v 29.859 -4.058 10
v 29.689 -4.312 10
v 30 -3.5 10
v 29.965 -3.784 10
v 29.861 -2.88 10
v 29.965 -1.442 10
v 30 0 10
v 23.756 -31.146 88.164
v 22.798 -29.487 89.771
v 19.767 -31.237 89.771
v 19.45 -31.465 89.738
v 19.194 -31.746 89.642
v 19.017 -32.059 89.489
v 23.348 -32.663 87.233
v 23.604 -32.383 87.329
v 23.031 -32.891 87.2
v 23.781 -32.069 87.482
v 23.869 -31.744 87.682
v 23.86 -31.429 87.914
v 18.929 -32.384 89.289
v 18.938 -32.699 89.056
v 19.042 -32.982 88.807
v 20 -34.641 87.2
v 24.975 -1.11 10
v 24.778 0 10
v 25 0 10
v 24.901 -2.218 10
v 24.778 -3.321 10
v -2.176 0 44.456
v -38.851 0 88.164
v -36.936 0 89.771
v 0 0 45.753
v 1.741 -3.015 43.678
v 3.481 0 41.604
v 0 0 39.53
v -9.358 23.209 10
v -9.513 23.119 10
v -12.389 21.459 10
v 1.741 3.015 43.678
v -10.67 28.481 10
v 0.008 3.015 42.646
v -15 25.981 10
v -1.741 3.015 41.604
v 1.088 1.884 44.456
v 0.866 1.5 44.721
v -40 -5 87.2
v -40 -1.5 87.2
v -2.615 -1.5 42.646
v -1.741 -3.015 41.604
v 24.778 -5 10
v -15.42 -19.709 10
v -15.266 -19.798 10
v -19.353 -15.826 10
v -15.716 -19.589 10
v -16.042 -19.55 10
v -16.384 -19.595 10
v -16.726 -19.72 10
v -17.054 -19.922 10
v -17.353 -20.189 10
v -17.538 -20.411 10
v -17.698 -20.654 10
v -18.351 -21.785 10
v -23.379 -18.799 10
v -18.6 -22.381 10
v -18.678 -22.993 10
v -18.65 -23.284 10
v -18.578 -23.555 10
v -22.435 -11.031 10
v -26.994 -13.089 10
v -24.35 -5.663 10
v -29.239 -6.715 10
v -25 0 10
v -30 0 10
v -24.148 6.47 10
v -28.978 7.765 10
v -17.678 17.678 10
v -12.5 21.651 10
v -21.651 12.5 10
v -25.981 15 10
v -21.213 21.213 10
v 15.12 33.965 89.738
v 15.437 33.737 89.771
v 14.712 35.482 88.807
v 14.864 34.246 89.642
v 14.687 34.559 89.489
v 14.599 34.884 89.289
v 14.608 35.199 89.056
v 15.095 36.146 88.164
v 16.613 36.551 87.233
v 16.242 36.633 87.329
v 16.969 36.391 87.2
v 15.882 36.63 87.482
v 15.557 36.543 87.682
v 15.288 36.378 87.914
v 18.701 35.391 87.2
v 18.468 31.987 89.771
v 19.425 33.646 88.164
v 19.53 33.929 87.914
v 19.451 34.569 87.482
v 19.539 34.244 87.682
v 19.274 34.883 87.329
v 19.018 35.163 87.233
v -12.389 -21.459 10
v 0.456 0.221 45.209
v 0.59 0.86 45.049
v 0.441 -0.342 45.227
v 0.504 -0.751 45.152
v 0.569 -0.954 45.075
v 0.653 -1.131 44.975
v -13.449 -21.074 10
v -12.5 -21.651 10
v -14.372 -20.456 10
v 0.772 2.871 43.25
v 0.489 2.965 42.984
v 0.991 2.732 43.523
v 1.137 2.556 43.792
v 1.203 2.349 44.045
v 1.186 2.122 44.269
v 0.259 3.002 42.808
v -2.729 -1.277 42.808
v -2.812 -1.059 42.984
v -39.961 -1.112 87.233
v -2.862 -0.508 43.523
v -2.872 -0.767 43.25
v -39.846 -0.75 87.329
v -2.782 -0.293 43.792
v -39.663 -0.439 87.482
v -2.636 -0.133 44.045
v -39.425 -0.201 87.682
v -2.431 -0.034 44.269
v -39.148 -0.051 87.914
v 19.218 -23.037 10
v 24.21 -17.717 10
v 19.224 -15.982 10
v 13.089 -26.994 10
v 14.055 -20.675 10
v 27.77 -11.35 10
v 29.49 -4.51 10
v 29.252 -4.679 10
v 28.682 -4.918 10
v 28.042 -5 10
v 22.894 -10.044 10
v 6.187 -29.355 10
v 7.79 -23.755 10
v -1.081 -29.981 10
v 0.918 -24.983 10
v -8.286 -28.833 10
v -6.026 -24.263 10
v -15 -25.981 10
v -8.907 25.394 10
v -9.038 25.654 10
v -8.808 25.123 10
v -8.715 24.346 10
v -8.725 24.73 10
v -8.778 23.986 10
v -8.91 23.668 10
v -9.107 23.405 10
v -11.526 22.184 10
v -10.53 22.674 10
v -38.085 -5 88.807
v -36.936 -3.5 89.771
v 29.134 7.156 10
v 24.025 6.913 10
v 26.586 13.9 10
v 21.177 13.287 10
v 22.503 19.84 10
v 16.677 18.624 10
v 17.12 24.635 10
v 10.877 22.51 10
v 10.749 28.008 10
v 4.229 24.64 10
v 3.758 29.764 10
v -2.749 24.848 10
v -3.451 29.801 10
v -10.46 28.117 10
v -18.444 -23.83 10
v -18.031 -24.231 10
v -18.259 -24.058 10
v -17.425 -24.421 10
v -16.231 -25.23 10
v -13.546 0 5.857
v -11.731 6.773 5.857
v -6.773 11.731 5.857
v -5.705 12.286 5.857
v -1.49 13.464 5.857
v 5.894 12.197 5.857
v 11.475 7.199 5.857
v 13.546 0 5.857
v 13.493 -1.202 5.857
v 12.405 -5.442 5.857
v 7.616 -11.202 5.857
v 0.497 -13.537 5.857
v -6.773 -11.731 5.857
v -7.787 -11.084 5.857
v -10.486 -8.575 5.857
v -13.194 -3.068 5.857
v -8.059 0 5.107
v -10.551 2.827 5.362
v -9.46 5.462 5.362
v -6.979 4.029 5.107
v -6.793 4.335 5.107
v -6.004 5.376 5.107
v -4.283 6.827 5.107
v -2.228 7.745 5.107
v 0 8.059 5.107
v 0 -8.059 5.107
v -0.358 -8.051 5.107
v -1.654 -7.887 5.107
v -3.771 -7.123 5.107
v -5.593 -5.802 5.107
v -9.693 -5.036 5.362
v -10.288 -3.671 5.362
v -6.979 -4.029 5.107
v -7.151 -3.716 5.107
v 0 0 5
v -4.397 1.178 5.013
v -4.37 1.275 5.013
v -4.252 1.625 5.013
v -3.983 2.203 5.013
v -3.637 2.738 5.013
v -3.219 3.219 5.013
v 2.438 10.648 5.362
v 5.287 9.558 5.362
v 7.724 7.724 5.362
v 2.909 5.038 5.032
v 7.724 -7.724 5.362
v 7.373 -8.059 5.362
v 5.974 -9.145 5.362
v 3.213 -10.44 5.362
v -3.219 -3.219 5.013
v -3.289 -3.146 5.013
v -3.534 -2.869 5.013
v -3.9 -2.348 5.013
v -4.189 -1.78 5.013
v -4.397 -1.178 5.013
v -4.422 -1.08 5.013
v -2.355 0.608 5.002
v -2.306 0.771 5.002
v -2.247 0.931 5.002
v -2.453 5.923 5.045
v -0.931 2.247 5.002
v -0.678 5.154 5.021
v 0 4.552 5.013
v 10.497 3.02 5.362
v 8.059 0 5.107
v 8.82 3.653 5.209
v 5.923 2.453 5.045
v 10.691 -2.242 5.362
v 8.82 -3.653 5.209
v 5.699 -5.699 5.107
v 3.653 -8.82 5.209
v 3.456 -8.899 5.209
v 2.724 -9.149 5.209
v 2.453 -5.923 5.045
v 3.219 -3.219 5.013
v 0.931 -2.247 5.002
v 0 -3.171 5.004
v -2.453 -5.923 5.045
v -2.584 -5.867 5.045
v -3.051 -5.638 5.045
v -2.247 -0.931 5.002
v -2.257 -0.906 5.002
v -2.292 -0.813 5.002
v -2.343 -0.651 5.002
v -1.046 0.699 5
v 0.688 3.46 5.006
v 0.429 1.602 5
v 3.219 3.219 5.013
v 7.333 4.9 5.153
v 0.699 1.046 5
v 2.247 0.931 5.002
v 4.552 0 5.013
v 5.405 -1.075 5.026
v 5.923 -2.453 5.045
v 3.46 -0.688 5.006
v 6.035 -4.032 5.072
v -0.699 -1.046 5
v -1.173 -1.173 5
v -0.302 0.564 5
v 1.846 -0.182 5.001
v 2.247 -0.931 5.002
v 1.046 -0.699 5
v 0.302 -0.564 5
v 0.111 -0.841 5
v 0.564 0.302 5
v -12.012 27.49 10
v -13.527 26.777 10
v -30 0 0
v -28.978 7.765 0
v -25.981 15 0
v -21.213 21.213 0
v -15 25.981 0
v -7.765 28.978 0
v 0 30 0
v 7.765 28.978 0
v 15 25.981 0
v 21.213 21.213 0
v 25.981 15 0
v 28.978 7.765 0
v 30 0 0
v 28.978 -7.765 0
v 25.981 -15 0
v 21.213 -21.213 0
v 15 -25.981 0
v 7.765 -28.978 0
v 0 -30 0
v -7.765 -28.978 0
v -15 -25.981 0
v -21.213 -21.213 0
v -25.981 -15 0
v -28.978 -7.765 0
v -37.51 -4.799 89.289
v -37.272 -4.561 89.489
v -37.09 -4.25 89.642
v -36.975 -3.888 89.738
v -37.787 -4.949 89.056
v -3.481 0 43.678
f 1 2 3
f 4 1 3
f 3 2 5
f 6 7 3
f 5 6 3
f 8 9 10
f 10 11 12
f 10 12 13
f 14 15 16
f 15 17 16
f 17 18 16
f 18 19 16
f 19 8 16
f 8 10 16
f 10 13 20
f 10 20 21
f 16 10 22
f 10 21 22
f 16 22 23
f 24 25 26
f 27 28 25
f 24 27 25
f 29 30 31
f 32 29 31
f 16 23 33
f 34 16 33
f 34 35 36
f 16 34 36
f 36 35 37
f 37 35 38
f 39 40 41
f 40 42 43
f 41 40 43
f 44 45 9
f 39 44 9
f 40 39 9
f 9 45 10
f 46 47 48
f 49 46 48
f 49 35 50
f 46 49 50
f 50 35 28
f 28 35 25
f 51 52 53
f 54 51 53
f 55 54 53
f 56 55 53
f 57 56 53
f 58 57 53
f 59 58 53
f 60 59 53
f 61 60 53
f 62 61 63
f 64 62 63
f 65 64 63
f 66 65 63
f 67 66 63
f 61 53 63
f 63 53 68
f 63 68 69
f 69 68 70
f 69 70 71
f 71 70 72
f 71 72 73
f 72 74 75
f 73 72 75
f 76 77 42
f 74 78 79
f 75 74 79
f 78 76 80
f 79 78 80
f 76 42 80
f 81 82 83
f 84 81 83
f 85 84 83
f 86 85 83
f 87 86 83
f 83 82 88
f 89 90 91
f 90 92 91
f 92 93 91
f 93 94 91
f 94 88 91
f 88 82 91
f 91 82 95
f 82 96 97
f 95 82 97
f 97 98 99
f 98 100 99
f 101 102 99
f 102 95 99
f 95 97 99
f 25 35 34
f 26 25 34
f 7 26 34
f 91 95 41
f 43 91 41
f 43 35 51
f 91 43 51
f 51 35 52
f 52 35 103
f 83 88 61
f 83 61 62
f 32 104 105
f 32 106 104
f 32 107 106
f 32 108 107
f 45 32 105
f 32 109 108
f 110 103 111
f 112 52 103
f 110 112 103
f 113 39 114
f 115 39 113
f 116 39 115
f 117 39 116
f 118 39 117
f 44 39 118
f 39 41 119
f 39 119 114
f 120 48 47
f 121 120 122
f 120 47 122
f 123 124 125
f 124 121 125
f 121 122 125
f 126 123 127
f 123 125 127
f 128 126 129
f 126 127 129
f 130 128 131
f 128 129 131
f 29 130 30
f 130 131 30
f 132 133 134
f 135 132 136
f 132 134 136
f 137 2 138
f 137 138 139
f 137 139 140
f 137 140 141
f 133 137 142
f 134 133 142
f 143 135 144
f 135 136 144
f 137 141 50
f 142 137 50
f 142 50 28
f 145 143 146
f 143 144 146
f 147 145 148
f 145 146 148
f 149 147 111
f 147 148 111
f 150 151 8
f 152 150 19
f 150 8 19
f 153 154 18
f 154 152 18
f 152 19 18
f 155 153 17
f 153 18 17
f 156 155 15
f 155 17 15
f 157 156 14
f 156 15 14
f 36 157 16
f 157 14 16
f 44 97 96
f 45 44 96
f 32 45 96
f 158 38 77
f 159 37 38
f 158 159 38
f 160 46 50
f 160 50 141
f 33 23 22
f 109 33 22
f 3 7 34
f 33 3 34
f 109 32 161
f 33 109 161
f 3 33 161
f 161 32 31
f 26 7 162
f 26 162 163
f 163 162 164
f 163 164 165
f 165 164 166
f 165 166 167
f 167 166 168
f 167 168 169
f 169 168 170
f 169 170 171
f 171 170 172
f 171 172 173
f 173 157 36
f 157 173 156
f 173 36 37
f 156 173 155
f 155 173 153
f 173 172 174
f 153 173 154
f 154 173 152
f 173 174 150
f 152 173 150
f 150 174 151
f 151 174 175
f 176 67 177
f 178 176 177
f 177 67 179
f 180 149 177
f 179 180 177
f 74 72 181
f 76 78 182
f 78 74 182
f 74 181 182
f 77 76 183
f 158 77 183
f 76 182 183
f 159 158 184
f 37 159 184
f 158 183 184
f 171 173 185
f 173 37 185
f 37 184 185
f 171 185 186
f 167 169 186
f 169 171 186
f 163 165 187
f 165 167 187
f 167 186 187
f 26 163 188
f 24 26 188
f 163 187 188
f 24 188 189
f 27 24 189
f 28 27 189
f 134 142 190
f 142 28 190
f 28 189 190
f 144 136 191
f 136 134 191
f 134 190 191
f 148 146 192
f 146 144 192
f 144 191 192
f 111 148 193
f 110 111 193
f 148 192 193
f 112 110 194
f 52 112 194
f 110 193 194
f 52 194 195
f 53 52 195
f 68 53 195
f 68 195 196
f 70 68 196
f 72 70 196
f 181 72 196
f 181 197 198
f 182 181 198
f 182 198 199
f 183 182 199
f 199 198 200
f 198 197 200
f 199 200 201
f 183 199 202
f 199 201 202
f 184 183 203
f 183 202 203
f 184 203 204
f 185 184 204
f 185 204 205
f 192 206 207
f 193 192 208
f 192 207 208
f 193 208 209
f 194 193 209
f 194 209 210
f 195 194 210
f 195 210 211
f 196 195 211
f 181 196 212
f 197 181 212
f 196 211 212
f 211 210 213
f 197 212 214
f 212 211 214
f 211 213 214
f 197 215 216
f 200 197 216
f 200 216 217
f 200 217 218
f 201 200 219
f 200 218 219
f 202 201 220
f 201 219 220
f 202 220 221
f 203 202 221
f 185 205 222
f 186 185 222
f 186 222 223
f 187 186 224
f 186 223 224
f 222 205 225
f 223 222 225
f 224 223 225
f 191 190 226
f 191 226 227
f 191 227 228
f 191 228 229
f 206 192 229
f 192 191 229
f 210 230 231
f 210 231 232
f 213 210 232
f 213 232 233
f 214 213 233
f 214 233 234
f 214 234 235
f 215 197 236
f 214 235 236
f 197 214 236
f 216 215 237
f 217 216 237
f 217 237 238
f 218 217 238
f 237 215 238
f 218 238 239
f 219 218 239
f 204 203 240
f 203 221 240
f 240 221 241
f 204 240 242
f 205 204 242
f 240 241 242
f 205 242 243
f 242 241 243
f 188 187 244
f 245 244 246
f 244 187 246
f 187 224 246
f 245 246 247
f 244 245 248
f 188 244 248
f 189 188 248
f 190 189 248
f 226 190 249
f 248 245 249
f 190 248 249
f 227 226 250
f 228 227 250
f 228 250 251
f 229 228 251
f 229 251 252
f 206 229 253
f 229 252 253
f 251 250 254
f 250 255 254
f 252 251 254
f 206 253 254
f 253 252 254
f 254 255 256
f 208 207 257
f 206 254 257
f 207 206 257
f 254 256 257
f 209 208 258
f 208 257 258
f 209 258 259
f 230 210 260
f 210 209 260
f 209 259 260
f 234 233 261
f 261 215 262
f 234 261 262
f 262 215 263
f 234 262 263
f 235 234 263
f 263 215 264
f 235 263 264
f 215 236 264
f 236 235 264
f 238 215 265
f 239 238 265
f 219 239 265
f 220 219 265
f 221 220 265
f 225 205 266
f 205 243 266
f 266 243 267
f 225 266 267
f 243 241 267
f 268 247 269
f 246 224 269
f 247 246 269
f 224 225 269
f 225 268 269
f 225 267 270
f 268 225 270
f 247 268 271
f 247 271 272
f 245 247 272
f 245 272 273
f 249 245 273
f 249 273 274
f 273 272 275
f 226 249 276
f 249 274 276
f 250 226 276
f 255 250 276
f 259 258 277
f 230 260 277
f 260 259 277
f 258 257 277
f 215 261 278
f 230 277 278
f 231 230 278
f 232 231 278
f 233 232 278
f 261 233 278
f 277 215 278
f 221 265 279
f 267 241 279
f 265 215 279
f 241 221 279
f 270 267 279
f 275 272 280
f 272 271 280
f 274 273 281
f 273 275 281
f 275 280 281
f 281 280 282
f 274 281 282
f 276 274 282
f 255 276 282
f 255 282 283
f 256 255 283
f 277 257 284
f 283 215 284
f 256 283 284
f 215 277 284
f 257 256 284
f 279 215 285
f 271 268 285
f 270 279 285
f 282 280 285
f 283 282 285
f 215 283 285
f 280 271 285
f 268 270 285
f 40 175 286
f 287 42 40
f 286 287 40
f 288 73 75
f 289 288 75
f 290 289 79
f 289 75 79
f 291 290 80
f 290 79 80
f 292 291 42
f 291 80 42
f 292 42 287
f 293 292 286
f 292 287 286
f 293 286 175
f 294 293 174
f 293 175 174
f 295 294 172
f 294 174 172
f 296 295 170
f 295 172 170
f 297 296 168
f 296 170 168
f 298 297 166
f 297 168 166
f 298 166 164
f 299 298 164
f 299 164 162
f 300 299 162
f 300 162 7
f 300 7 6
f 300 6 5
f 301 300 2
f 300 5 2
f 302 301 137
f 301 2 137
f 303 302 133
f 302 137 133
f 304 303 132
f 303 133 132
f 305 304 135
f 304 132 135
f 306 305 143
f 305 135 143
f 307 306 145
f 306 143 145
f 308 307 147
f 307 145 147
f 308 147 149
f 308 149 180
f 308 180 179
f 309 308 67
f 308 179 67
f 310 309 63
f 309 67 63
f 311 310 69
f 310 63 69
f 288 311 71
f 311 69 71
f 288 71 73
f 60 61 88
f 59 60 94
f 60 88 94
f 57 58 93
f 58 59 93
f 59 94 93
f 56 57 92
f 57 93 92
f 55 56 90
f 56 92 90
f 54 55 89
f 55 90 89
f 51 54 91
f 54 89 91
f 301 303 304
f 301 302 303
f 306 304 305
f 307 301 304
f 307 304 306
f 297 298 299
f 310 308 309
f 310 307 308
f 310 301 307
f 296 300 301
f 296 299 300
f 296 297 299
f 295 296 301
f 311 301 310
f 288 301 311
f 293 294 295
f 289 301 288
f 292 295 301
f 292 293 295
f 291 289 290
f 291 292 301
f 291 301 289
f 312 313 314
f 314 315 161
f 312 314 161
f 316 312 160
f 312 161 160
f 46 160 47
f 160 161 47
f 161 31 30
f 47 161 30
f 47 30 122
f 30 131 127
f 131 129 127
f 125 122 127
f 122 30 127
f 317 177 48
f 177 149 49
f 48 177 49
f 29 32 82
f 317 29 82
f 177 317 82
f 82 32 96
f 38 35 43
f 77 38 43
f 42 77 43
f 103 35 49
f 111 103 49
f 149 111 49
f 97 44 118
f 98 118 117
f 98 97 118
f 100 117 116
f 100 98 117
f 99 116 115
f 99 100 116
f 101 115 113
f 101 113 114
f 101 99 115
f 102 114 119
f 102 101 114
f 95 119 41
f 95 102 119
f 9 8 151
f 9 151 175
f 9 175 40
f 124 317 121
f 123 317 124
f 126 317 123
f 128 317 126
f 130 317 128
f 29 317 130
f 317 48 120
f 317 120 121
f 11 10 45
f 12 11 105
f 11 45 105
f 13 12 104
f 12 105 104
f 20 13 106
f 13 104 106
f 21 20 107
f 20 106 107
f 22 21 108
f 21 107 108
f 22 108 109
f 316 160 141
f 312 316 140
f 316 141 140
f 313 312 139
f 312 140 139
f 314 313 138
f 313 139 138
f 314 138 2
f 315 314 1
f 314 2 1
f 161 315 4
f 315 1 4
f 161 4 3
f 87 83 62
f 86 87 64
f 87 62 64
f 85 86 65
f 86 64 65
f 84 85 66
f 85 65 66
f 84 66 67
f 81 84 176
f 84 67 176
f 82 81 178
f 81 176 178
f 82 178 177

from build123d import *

# Parameters (mm, degrees)
F0_W         = 5
F0_H         = 10
F3_DEPTH     = 5
F4_COUNT     = 3
F5_T4_DEPTH  = 64.961938704
F5_T9_DEPTH  = 108.2772549851
F5_T14_DEPTH = 111.6336535099
F5_T19_DEPTH = 111.6336535099
F5_T24_DEPTH = 64.3133444777
F5_T29_DEPTH = 64.3133444777
F5_T34_DEPTH = 108.2772549851


# Not quite as in the source:
# - a fillet or chamfer that OpenCascade refuses, or shapes differently, is made with other operations: its cross-section is extruded or revolved along the edge and cut away or added


with BuildPart() as f1:
    # F0 (on Front) → F1 (revolve)
    with BuildSketch(Plane.XZ):
        with Locations((-27.5, 5)):
            Rectangle(F0_W, F0_H)
        with BuildLine():
            Line((-25, 10), (-25, 0))
            Line((-25, 0), (0, 0))
            Line((0, 0), (0, 5))
            add(Edge.make_bspline(
                [(-25, 10), (-12.5, 5), (-12.5, 5), (0, 5)],
                knots=[0, 0, 0, 0, 25.495097568, 25.495097568, 25.495097568, 25.495097568], degree=3))
        make_face()
    revolve(axis=Axis((0, 0, 2.5), (0, 0, -1)))

    # F2 (on Front) → F3 (join)
    with BuildSketch(Plane.XZ):
        Polygon((24.7783708427, 10), (30, 10), (-36.9358222275, 89.7710066129), (-40, 87.1998561742), align=None)
    extrude(amount=F3_DEPTH)

    # F4: F1 ×3 about axis
    f4_axis = Axis((0, 0, 2.5), (0, 0, -1))


with BuildPart() as f1_1:
    add(f1.part)
    for i in range(1, F4_COUNT):
        add(f1.part.rotate(f4_axis, i * 360 / F4_COUNT))

    # F5: fillet of radius 1.5 on 7 edges, made by hand


with BuildPart() as f5_tool2:
    # F5_s3 → F5_t4 (new body)
    with BuildSketch(Plane(origin=(10.0591539469, -17.4229657171, 23.9760657093), x_dir=(0.8660254038, 0.5, 0), z_dir=(0.3213938048, -0.5566703992, 0.7660444431))):
        with BuildLine():
            ThreePointArc((1.5, 29.4092093904), (0.4393398282, 28.9698695622), (0, 27.9092093904))
            Line((0, 27.9092093904), (0, 29.4092093904))
            Line((0, 29.4092093904), (1.5, 29.4092093904))
        make_face()
    extrude(amount=F5_T4_DEPTH)

    split(bisect_by=Plane(origin=(22.5287614301, 0, 18.9038754068), x_dir=(0, 1, 0), z_dir=(0.7660444431, 0, 0.6427876097)), keep=Keep.TOP)


with BuildPart() as f1_2:
    add(f1_1.part)

    # F5_t1: cut F5_tool2
    add(f5_tool2.part, mode=Mode.SUBTRACT)


with BuildPart() as f5_tool7:
    # F5_s8 → F5_t9 (new body)
    with BuildSketch(Plane(origin=(30.937518597, -53.58535407, 73.7397978677), x_dir=(-0.8660254038, -0.5, 0), z_dir=(-0.3213938048, 0.5566703992, -0.7660444431))):
        with BuildLine():
            ThreePointArc((-5, 26.9092093904), (-4.5606601718, 25.8485492187), (-3.5, 25.4092093904))
            Line((-3.5, 25.4092093904), (-5, 25.4092093904))
            Line((-5, 25.4092093904), (-5, 26.9092093904))
        make_face()
    extrude(amount=F5_T9_DEPTH)

    split(bisect_by=Plane.XY.offset(10), keep=Keep.TOP)


with BuildPart() as f1_3:
    add(f1_2.part)

    # F5_t6: cut F5_tool7
    add(f5_tool7.part, mode=Mode.SUBTRACT)


with BuildPart() as f5_tool12:
    # F5_s13 → F5_t14 (new body)
    with BuildSketch(Plane(origin=(9.8816921063, 0, -11.7765420685), x_dir=(0, 1, 0), z_dir=(-0.6427876097, 0, 0.7660444431))):
        with BuildLine():
            ThreePointArc((-5, -27.9092093904), (-4.5606601718, -28.9698695622), (-3.5, -29.4092093904))
            Line((-3.5, -29.4092093904), (-5, -29.4092093904))
            Line((-5, -29.4092093904), (-5, -27.9092093904))
        make_face()
    extrude(amount=F5_T14_DEPTH)

    split(bisect_by=Plane.XY.offset(10), keep=Keep.TOP)


with BuildPart() as f1_4:
    add(f1_3.part)

    # F5_t11: cut F5_tool12
    add(f5_tool12.part, mode=Mode.SUBTRACT)


with BuildPart() as f5_tool17:
    # F5_s18 → F5_t19 (new body)
    with BuildSketch(Plane(origin=(-4.9408460531, -8.5577963964, -11.7765420685), x_dir=(-0.8660254038, 0.5, 0), z_dir=(0.3213938048, 0.5566703992, 0.7660444431))):
        with BuildLine():
            ThreePointArc((5, 27.9092093904), (4.5606601718, 28.9698695622), (3.5, 29.4092093904))
            Line((3.5, 29.4092093904), (5, 29.4092093904))
            Line((5, 29.4092093904), (5, 27.9092093904))
        make_face()
    extrude(amount=F5_T19_DEPTH)

    split(bisect_by=Plane.XY.offset(10), keep=Keep.TOP)


with BuildPart() as f1_5:
    add(f1_4.part)

    # F5_t16: cut F5_tool17
    add(f5_tool17.part, mode=Mode.SUBTRACT)


with BuildPart() as f5_tool22:
    # F5_s23 → F5_t24 (new body)
    with BuildSketch(Plane(origin=(-61.8750371939, 0, 73.7397978677), x_dir=(0, 1, 0), z_dir=(0.6427876097, 0, -0.7660444431))):
        with BuildLine():
            ThreePointArc((-1.5, 25.4092093904), (-0.4393398282, 25.8485492187), (0, 26.9092093904))
            Line((0, 26.9092093904), (0, 25.4092093904))
            Line((0, 25.4092093904), (-1.5, 25.4092093904))
        make_face()
    extrude(amount=F5_T24_DEPTH)

    split(bisect_by=Plane(origin=(-11.264380715, -19.5104797142, 18.9038754068), x_dir=(0.8660254038, -0.5, 0), z_dir=(-0.3830222216, -0.6634139482, 0.6427876097)), keep=Keep.TOP)


with BuildPart() as f1_6:
    add(f1_5.part)

    # F5_t21: cut F5_tool22
    add(f5_tool22.part, mode=Mode.SUBTRACT)


with BuildPart() as f5_tool27:
    # F5_s28 → F5_t29 (new body)
    with BuildSketch(Plane(origin=(30.937518597, 53.58535407, 73.7397978677), x_dir=(0.8660254038, -0.5, 0), z_dir=(-0.3213938048, -0.5566703992, -0.7660444431))):
        with BuildLine():
            ThreePointArc((0, 26.9092093904), (-0.4393398282, 25.8485492187), (-1.5, 25.4092093904))
            Line((-1.5, 25.4092093904), (0, 25.4092093904))
            Line((0, 25.4092093904), (0, 26.9092093904))
        make_face()
    extrude(amount=F5_T29_DEPTH)

    split(bisect_by=Plane(origin=(-11.264380715, 19.5104797142, 18.9038754068), x_dir=(-0.8660254038, -0.5, 0), z_dir=(-0.3830222216, 0.6634139482, 0.6427876097)), keep=Keep.TOP)


with BuildPart() as f1_7:
    add(f1_6.part)

    # F5_t26: cut F5_tool27
    add(f5_tool27.part, mode=Mode.SUBTRACT)


with BuildPart() as f5_tool32:
    # F5_s33 → F5_t34 (new body)
    with BuildSketch(Plane(origin=(30.937518597, 53.58535407, 73.7397978677), x_dir=(0.8660254038, -0.5, 0), z_dir=(-0.3213938048, -0.5566703992, -0.7660444431))):
        with BuildLine():
            ThreePointArc((-5, 26.9092093904), (-4.5606601718, 25.8485492187), (-3.5, 25.4092093904))
            Line((-3.5, 25.4092093904), (-5, 25.4092093904))
            Line((-5, 25.4092093904), (-5, 26.9092093904))
        make_face()
    extrude(amount=F5_T34_DEPTH)

    split(bisect_by=Plane.XY.offset(10), keep=Keep.TOP)


with BuildPart() as f1_8:
    add(f1_7.part)

    # F5_t31: cut F5_tool32
    add(f5_tool32.part, mode=Mode.SUBTRACT)


solid = f1_8.part
